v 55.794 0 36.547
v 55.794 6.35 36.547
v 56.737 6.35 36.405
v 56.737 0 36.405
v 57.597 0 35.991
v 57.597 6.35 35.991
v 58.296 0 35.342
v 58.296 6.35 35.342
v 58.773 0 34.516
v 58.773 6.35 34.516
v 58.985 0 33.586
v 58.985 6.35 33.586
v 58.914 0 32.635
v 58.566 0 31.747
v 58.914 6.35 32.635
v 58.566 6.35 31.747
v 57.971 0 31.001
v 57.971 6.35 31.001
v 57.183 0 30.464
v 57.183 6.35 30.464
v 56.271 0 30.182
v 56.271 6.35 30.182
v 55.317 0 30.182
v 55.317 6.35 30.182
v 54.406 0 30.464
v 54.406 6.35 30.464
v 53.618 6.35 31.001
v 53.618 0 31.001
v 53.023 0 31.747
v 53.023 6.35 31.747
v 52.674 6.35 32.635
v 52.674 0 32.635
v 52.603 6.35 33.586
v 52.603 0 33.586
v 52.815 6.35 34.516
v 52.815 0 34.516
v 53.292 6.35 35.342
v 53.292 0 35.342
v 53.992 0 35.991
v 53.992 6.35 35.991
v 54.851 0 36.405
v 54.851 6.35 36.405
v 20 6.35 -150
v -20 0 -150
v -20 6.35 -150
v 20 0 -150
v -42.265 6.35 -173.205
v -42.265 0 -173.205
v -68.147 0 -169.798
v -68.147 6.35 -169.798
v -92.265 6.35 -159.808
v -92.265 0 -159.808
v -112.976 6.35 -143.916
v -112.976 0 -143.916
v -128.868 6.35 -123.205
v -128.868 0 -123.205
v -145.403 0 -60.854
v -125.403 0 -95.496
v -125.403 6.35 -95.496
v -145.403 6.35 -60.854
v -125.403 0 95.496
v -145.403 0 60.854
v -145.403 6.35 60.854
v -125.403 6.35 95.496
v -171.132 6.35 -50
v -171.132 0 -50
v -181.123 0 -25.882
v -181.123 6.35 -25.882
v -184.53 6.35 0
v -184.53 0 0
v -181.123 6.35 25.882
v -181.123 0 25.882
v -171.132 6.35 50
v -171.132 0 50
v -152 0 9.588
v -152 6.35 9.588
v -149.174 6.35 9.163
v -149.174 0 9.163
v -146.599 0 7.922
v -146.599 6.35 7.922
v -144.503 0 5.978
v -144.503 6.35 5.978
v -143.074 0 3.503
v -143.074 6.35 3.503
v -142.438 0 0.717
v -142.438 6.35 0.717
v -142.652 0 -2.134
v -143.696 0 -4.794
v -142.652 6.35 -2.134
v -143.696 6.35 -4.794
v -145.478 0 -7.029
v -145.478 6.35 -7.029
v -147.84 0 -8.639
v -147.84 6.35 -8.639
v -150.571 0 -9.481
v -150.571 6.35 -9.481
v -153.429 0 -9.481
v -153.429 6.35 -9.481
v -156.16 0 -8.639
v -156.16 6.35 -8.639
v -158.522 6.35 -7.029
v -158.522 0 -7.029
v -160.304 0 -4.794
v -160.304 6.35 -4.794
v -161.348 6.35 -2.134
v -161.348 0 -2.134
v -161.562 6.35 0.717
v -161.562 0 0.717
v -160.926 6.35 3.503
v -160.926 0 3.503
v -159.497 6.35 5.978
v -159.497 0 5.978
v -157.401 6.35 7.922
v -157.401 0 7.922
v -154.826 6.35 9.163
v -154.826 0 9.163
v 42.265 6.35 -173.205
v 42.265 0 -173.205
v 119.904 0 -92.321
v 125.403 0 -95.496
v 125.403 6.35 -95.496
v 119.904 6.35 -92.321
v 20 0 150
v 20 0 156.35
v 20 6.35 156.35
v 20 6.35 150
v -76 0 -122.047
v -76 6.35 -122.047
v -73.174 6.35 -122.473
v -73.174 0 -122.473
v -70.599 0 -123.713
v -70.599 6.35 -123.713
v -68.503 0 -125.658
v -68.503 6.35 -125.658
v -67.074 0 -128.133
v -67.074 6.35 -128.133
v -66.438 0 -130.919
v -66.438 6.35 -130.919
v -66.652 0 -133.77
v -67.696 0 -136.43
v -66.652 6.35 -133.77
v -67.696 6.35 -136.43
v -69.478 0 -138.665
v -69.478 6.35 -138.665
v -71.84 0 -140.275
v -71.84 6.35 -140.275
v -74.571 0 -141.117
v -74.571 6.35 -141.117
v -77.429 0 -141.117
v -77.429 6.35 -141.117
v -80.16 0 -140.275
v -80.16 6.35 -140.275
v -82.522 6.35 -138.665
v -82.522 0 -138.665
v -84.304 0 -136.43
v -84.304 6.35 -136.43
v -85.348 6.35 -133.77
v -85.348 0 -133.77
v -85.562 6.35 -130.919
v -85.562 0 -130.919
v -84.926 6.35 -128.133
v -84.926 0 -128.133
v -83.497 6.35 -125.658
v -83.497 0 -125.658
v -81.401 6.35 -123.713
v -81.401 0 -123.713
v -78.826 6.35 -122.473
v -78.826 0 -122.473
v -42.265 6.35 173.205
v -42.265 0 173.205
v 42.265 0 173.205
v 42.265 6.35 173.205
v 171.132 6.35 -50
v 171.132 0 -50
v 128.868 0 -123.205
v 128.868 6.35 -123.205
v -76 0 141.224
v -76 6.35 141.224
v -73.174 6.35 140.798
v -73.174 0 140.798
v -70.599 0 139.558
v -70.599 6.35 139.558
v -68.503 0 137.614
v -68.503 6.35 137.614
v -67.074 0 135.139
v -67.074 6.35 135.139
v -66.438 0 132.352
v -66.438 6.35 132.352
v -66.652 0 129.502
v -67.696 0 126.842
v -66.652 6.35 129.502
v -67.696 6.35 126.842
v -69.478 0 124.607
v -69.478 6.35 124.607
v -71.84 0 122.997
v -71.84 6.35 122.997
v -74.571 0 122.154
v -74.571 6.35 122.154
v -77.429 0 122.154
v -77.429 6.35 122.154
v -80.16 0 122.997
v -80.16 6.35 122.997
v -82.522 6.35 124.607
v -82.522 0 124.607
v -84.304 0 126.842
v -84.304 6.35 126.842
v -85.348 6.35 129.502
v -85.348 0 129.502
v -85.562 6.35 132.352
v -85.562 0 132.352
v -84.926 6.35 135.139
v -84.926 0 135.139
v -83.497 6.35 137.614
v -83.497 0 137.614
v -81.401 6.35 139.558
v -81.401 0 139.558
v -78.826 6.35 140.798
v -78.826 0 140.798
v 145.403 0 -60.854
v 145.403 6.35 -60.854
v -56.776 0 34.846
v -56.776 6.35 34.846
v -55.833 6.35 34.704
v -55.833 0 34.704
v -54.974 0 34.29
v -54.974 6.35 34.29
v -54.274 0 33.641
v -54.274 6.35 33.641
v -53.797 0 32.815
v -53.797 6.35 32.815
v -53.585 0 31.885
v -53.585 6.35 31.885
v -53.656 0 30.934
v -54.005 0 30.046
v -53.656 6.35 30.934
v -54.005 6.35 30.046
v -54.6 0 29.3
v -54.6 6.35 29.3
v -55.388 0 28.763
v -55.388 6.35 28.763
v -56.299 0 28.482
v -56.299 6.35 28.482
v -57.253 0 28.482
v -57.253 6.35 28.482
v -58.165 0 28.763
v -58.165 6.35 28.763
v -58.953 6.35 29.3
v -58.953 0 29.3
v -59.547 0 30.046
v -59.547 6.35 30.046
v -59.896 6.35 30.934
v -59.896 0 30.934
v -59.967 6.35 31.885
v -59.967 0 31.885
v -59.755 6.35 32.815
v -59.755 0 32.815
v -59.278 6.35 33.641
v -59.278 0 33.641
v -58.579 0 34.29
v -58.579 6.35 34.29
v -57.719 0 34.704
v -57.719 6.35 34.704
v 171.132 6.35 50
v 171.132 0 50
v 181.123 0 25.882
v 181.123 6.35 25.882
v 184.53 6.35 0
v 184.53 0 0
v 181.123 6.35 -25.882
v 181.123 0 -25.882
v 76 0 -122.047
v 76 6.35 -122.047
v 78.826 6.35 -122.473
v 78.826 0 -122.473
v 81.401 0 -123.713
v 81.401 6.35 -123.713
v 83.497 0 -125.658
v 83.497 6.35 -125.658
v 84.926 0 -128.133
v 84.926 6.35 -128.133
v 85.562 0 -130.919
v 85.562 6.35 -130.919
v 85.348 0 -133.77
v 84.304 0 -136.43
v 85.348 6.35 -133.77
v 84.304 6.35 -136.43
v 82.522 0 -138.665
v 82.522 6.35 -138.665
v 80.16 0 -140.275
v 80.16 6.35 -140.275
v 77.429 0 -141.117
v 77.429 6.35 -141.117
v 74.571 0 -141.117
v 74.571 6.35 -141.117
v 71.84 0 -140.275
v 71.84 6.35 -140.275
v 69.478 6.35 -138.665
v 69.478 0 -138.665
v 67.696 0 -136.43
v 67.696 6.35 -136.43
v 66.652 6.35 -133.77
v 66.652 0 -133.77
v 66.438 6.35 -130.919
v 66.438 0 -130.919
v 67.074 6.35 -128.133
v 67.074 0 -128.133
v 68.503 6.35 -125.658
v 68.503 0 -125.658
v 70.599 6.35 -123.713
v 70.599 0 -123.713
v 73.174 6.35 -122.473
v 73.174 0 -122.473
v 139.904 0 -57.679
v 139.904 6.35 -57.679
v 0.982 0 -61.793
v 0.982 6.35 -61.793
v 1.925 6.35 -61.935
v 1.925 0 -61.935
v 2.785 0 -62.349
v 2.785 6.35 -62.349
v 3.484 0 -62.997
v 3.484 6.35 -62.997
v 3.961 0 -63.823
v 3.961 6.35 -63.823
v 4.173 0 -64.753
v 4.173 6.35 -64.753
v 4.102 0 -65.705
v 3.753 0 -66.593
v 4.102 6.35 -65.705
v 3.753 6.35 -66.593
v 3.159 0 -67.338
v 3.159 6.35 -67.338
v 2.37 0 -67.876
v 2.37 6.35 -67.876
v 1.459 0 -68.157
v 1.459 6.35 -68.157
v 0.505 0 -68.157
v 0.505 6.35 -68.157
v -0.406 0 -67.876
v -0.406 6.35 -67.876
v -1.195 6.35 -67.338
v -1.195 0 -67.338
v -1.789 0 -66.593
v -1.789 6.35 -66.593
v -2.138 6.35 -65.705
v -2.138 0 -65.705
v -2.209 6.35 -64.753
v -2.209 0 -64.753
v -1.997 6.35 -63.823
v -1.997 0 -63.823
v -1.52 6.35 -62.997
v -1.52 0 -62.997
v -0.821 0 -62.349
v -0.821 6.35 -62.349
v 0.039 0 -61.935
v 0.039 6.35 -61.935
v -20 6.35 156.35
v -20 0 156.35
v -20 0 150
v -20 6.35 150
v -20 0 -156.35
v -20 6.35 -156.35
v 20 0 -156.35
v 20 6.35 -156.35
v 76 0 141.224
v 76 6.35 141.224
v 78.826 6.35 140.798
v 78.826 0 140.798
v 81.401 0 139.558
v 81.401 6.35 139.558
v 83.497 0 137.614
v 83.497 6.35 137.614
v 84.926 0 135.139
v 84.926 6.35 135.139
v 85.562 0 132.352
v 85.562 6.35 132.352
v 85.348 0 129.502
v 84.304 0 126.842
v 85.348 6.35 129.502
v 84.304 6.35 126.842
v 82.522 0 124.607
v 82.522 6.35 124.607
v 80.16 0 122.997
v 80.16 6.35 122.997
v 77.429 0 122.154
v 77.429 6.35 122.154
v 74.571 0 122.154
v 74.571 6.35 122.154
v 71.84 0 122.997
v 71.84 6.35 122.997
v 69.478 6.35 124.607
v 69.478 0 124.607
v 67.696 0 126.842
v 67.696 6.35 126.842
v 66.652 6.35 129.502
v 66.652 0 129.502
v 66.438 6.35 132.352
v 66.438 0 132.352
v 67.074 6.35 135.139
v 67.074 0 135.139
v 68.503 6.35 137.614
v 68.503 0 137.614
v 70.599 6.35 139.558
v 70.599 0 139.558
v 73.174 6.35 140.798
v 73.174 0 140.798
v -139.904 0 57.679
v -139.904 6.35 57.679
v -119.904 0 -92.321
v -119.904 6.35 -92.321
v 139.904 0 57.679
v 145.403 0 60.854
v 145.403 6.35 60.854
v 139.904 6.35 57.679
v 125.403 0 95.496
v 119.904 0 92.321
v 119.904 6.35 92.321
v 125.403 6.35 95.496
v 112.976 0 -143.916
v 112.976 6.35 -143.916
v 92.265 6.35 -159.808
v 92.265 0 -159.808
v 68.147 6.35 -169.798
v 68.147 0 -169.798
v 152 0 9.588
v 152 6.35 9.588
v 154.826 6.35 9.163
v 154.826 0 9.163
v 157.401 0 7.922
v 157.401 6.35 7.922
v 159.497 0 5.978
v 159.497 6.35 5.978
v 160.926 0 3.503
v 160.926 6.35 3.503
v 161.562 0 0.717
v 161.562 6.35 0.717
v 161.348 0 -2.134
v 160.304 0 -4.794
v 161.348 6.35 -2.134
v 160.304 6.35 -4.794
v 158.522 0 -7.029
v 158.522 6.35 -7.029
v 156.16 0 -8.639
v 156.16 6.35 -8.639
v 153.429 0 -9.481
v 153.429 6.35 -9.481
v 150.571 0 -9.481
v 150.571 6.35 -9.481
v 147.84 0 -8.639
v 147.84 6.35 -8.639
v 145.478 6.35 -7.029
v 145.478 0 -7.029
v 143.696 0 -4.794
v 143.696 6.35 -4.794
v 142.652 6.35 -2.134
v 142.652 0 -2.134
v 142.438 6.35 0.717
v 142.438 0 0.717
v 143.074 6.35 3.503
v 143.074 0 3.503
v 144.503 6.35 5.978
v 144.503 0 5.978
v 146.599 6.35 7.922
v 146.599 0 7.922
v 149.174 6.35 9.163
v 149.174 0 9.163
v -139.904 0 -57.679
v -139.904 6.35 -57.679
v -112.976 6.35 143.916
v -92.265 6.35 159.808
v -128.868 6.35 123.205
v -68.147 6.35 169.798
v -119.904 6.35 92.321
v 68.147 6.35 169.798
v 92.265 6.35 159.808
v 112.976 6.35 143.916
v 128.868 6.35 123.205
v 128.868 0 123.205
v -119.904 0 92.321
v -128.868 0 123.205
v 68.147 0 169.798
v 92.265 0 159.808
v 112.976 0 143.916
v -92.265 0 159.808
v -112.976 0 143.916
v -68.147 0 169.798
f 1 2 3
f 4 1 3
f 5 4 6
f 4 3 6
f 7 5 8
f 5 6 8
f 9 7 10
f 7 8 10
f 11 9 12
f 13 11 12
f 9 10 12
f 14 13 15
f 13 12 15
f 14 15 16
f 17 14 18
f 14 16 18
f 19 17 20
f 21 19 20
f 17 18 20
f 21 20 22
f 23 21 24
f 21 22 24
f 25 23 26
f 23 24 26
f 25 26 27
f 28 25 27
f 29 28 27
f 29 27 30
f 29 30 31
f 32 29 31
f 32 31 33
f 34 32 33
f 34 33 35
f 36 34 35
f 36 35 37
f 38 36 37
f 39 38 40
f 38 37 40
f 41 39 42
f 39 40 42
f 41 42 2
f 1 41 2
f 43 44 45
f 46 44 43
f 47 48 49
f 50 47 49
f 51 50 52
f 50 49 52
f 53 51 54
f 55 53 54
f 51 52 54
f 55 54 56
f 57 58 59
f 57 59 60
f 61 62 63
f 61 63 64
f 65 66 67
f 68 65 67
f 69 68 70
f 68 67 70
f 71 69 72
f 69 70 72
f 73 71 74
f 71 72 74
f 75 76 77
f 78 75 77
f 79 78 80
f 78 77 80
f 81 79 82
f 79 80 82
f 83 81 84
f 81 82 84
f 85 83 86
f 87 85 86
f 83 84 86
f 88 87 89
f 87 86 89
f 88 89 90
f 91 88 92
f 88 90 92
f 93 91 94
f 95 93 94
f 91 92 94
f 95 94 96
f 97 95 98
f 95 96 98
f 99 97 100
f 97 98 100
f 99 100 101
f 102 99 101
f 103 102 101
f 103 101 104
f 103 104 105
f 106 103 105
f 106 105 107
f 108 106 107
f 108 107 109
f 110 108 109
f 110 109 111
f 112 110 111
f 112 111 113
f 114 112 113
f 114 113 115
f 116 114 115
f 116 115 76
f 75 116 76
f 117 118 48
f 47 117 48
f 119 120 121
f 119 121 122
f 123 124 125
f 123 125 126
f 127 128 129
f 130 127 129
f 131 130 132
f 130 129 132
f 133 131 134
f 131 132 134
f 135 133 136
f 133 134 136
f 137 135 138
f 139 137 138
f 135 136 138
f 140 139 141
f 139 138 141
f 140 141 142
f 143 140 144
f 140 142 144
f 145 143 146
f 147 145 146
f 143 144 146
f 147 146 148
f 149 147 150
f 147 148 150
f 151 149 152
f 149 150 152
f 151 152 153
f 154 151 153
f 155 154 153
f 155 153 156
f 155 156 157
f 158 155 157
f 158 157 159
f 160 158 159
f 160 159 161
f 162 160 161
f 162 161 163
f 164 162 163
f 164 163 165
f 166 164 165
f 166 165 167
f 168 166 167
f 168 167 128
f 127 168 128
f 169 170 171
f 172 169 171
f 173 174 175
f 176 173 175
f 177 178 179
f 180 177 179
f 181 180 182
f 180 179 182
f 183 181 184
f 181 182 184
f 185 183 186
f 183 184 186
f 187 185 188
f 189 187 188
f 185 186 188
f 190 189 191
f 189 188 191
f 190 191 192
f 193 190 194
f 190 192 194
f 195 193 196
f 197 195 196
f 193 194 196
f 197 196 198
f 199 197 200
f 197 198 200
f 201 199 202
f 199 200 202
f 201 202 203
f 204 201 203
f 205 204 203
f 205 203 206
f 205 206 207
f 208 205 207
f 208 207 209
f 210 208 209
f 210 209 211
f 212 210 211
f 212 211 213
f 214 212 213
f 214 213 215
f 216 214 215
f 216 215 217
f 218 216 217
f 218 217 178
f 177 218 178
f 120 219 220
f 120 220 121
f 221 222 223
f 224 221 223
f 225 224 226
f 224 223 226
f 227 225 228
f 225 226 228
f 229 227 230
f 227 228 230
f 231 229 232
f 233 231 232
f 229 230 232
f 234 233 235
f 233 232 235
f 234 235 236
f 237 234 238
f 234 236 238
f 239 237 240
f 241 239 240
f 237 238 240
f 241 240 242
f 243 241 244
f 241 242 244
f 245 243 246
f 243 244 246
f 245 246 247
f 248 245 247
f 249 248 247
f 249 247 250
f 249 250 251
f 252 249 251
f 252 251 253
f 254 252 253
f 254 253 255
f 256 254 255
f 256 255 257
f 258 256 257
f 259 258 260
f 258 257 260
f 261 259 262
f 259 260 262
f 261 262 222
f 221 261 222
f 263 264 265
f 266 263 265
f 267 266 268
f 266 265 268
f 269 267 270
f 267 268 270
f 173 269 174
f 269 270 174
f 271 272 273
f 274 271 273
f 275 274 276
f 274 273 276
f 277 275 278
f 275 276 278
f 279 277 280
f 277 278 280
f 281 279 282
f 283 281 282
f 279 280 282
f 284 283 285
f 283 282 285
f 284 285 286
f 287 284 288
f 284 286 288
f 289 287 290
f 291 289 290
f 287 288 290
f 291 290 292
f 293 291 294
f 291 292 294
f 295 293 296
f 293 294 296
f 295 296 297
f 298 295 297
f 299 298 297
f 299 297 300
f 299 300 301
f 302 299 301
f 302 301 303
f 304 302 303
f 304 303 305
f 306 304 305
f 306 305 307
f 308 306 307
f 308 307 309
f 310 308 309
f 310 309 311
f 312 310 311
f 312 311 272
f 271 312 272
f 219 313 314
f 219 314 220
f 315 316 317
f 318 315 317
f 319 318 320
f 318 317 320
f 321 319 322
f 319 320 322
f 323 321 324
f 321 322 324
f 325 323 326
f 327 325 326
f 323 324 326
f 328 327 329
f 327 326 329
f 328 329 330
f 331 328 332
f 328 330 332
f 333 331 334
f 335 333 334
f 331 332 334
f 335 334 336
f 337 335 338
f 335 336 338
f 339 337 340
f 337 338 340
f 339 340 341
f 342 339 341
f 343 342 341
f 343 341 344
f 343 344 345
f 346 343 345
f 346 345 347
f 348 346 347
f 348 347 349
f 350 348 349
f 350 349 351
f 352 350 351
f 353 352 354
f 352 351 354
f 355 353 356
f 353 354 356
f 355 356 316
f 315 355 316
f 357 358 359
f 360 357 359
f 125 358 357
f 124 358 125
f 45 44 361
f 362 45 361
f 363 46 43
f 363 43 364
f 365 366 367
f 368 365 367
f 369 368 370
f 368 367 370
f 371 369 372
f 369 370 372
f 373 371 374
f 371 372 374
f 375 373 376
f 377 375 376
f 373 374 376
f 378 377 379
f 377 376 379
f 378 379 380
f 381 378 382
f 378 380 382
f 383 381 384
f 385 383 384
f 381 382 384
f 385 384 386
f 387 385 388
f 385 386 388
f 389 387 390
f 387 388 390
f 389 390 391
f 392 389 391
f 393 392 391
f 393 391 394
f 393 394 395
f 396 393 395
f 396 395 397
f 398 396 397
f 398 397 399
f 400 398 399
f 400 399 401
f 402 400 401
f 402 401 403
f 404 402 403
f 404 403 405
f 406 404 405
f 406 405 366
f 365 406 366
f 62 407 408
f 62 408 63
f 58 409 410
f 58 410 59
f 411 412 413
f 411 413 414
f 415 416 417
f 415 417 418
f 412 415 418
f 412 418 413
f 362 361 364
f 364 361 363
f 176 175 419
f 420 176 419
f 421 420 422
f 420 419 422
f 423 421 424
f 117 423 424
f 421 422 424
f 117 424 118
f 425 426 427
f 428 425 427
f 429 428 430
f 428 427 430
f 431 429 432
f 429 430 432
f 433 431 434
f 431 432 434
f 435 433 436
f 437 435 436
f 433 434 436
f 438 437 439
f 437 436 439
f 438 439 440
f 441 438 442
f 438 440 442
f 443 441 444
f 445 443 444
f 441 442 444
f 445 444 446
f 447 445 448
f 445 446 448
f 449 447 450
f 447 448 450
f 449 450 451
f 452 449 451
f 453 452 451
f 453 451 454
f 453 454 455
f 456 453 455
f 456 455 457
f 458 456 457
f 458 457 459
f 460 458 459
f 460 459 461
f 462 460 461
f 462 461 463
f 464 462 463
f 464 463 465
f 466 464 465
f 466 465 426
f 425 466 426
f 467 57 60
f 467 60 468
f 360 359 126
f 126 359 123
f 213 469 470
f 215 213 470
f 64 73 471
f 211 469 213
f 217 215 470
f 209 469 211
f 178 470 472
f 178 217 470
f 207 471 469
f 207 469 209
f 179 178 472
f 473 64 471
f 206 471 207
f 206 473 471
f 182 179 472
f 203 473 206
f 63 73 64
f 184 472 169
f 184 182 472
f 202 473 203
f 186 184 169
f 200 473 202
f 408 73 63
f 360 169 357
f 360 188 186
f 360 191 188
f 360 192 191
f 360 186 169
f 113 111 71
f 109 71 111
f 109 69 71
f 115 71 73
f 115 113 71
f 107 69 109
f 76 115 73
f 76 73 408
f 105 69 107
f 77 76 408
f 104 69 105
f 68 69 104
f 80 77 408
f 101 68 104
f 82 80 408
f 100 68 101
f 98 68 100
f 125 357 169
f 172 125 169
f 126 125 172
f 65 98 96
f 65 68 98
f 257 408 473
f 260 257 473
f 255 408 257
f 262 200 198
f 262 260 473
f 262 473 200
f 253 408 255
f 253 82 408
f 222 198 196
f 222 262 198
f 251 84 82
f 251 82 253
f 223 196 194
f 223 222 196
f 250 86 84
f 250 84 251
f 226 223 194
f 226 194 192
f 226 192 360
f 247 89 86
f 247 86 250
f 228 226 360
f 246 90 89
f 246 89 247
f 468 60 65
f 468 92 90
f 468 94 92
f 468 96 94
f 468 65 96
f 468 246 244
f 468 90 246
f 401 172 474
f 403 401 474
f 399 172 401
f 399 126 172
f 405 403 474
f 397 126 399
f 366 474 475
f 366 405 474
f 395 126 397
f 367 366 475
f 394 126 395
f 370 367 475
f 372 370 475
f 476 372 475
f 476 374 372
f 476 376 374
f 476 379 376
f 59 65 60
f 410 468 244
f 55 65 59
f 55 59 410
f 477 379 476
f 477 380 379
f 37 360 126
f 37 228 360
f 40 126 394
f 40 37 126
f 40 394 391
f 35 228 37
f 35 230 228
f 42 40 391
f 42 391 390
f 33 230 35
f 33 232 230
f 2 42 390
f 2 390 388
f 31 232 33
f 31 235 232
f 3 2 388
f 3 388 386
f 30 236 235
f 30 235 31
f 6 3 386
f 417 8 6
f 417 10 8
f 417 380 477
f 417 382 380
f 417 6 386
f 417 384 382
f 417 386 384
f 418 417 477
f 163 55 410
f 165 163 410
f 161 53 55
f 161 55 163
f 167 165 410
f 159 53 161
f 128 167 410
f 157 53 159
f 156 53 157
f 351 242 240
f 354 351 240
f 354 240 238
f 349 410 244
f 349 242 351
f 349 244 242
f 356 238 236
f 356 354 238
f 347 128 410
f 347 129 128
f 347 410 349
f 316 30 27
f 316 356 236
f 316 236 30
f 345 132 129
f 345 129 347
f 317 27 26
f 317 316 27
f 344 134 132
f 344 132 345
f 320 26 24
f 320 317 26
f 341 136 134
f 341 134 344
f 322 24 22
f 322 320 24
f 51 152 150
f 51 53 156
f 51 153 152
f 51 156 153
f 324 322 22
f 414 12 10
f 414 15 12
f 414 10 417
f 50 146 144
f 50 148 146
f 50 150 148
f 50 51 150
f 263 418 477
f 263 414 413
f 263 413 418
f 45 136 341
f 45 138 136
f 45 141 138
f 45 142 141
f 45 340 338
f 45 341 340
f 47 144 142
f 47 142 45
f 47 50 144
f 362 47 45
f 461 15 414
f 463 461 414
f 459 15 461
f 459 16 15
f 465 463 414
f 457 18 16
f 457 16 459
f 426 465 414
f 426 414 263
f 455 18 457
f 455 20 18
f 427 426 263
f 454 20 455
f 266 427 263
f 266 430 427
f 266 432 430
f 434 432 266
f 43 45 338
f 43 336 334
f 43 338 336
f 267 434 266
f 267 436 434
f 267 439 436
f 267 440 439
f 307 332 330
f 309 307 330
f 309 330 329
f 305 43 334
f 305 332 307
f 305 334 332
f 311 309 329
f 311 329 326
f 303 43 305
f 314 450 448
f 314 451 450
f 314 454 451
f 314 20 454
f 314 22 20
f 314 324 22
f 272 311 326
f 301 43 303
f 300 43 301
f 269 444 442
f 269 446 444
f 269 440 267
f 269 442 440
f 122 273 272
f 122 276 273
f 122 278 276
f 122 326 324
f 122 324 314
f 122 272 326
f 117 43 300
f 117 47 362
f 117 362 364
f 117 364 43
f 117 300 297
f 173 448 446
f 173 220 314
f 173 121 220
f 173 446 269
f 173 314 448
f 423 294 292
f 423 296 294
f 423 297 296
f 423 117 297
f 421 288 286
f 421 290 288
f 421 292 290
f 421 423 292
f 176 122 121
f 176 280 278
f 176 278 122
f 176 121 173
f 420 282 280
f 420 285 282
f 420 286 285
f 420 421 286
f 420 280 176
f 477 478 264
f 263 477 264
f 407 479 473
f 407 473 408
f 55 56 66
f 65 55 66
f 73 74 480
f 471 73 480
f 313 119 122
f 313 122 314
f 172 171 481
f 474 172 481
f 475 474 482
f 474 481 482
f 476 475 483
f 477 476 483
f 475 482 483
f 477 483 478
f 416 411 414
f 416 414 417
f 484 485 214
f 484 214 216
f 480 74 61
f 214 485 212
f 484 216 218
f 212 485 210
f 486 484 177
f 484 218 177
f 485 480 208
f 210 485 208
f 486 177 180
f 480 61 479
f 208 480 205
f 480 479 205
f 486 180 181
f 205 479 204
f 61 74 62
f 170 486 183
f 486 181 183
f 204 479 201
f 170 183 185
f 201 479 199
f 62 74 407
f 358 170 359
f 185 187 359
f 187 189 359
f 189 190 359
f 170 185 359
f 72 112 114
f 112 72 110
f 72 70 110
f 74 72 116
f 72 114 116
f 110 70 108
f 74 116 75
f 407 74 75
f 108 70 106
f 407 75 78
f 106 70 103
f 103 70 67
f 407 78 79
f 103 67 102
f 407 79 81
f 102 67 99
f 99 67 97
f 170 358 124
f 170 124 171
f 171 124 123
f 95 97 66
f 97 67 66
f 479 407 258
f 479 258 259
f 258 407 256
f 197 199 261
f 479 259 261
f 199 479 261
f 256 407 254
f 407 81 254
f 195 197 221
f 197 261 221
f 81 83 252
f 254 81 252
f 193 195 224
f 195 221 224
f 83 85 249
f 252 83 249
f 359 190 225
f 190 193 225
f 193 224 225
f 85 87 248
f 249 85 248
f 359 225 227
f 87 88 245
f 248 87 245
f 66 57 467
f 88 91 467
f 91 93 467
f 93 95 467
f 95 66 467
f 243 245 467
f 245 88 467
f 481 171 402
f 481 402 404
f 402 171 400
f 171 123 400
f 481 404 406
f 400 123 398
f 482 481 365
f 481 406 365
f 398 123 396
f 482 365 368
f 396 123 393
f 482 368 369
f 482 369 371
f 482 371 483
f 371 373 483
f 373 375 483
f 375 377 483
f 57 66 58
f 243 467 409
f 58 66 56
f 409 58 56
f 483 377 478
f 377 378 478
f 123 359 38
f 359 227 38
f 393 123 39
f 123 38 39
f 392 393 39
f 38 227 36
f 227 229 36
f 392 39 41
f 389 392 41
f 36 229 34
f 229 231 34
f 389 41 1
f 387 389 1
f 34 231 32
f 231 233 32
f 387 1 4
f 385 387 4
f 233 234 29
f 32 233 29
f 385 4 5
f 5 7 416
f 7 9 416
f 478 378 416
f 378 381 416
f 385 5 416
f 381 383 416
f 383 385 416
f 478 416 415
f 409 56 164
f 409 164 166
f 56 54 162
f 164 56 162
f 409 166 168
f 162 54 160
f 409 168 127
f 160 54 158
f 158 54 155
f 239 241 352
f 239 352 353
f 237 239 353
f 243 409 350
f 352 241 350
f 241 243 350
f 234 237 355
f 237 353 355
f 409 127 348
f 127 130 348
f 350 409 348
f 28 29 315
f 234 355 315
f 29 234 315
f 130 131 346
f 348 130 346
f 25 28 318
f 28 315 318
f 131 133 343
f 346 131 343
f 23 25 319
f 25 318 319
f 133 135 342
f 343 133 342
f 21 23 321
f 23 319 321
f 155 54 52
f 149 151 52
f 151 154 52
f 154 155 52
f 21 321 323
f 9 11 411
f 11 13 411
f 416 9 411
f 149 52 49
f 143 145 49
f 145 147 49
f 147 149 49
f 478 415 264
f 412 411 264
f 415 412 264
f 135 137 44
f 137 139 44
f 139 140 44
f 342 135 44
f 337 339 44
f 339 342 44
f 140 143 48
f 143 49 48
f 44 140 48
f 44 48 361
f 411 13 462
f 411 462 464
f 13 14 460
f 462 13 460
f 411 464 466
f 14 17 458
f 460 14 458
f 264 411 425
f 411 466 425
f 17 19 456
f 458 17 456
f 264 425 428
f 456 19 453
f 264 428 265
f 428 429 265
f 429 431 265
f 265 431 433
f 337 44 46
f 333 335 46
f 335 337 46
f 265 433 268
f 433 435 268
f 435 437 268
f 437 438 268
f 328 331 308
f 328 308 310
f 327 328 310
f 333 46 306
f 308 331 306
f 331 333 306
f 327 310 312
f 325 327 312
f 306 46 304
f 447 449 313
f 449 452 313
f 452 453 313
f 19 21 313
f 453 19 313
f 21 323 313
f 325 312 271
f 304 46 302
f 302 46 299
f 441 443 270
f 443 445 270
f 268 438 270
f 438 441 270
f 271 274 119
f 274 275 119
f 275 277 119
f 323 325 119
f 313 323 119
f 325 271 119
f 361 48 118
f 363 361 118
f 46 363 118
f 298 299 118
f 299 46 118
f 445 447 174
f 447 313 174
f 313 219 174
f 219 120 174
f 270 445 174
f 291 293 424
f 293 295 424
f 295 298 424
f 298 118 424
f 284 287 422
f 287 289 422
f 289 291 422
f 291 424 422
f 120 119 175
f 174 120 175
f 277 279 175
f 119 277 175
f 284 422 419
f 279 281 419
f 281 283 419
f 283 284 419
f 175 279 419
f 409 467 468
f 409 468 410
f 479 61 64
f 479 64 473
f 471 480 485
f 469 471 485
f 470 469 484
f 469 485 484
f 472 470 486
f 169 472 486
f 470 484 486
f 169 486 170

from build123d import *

# Parameters (mm, degrees)
SKETCH1_W           = 40
SKETCH1_H           = 6.35
BOSS_EXTRUDE1_DEPTH = 6.35
SKETCH2_R           = 3.2
CUT_EXTRUDE1_DEPTH  = 6.35
SKETCH3_R           = 9.5885
CUT_EXTRUDE2_DEPTH  = 254.16323495


with BuildPart() as part:
    # Sketch1 → Boss-Extrude1 (new body)
    with BuildSketch(Plane(origin=(0, 0, 0), x_dir=(1, 0, 0), z_dir=(0, 1, 0))):
        with BuildLine():
            Line((171.132486541, 50), (128.867513459, 123.205080757))
            ThreePointArc((128.867513459, 123.205080757), (92.264973081, 159.807621135), (42.264973081, 173.205080757))
            Line((42.264973081, 173.205080757), (-42.264973081, 173.205080757))
            ThreePointArc((-42.264973081, 173.205080757), (-92.264973081, 159.807621135), (-128.867513459, 123.205080757))
            Line((-128.867513459, 123.205080757), (-171.132486541, 50))
            ThreePointArc((-171.132486541, 50), (-184.529946162, 0), (-171.132486541, -50))
            Line((-171.132486541, -50), (-128.867513459, -123.205080757))
            ThreePointArc((-128.867513459, -123.205080757), (-92.264973081, -159.807621135), (-42.264973081, -173.205080757))
            Line((-42.264973081, -173.205080757), (42.264973081, -173.205080757))
            ThreePointArc((42.264973081, -173.205080757), (92.264973081, -159.807621135), (128.867513459, -123.205080757))
            Line((128.867513459, -123.205080757), (171.132486541, -50))
            ThreePointArc((171.132486541, -50), (184.529946162, 0), (171.132486541, 50))
        make_face()
        with Locations((0, -153.175)):
            Rectangle(SKETCH1_W, SKETCH1_H, mode=Mode.SUBTRACT)
        Polygon((-139.903810568, -57.679491924), (-145.403071882, -60.854491924), (-125.403071882, -95.495508076), (-119.903810568, -92.320508076), align=None, mode=Mode.SUBTRACT)
        Polygon((-119.903810568, 92.320508076), (-125.403071882, 95.495508076), (-145.403071882, 60.854491924), (-139.903810568, 57.679491924), align=None, mode=Mode.SUBTRACT)
        with Locations((0, 153.175)):
            Rectangle(SKETCH1_W, SKETCH1_H, mode=Mode.SUBTRACT)
        Polygon((139.903810568, 57.679491924), (145.403071882, 60.854491924), (125.403071882, 95.495508076), (119.903810568, 92.320508076), align=None, mode=Mode.SUBTRACT)
        Polygon((119.903810568, -92.320508076), (125.403071882, -95.495508076), (145.403071882, -60.854491924), (139.903810568, -57.679491924), align=None, mode=Mode.SUBTRACT)
    extrude(amount=BOSS_EXTRUDE1_DEPTH)

    # Sketch2 → Cut-Extrude1 (cut)
    with BuildSketch(Plane(origin=(0, 6.35, 0), x_dir=(1, 0, 0), z_dir=(0, 1, 0))):
        with Locations(Location((55.794244464, -33.346698257, 0), (0, 0, 270))):
            Circle(SKETCH2_R)
        with Locations(Location((-56.776210055, -31.645883963, 0), (0, 0, 270))):
            Circle(SKETCH2_R)
        with Locations(Location((0.981965591, 64.99258222, 0), (0, 0, 270))):
            Circle(SKETCH2_R)
    extrude(amount=-CUT_EXTRUDE1_DEPTH, mode=Mode.SUBTRACT)

    # Sketch3 → Cut-Extrude2 (cut, through all)
    with BuildSketch(Plane(origin=(0, 6.35, 0), x_dir=(1, 0, 0), z_dir=(0, 1, 0))):
        with Locations(Location((76, 131.635861375, 0), (0, 0, 270))):
            Circle(SKETCH3_R)
        with Locations(Location((152, 0, 0), (0, 0, 270))):
            Circle(SKETCH3_R)
        with Locations(Location((76, -131.635861375, 0), (0, 0, 270))):
            Circle(SKETCH3_R)
        with Locations(Location((-76, -131.635861375, 0), (0, 0, 270))):
            Circle(SKETCH3_R)
        with Locations(Location((-152, 0, 0), (0, 0, 270))):
            Circle(SKETCH3_R)
        with Locations(Location((-76, 131.635861375, 0), (0, 0, 270))):
            Circle(SKETCH3_R)
    extrude(amount=-CUT_EXTRUDE2_DEPTH, mode=Mode.SUBTRACT)


solid = part.part
